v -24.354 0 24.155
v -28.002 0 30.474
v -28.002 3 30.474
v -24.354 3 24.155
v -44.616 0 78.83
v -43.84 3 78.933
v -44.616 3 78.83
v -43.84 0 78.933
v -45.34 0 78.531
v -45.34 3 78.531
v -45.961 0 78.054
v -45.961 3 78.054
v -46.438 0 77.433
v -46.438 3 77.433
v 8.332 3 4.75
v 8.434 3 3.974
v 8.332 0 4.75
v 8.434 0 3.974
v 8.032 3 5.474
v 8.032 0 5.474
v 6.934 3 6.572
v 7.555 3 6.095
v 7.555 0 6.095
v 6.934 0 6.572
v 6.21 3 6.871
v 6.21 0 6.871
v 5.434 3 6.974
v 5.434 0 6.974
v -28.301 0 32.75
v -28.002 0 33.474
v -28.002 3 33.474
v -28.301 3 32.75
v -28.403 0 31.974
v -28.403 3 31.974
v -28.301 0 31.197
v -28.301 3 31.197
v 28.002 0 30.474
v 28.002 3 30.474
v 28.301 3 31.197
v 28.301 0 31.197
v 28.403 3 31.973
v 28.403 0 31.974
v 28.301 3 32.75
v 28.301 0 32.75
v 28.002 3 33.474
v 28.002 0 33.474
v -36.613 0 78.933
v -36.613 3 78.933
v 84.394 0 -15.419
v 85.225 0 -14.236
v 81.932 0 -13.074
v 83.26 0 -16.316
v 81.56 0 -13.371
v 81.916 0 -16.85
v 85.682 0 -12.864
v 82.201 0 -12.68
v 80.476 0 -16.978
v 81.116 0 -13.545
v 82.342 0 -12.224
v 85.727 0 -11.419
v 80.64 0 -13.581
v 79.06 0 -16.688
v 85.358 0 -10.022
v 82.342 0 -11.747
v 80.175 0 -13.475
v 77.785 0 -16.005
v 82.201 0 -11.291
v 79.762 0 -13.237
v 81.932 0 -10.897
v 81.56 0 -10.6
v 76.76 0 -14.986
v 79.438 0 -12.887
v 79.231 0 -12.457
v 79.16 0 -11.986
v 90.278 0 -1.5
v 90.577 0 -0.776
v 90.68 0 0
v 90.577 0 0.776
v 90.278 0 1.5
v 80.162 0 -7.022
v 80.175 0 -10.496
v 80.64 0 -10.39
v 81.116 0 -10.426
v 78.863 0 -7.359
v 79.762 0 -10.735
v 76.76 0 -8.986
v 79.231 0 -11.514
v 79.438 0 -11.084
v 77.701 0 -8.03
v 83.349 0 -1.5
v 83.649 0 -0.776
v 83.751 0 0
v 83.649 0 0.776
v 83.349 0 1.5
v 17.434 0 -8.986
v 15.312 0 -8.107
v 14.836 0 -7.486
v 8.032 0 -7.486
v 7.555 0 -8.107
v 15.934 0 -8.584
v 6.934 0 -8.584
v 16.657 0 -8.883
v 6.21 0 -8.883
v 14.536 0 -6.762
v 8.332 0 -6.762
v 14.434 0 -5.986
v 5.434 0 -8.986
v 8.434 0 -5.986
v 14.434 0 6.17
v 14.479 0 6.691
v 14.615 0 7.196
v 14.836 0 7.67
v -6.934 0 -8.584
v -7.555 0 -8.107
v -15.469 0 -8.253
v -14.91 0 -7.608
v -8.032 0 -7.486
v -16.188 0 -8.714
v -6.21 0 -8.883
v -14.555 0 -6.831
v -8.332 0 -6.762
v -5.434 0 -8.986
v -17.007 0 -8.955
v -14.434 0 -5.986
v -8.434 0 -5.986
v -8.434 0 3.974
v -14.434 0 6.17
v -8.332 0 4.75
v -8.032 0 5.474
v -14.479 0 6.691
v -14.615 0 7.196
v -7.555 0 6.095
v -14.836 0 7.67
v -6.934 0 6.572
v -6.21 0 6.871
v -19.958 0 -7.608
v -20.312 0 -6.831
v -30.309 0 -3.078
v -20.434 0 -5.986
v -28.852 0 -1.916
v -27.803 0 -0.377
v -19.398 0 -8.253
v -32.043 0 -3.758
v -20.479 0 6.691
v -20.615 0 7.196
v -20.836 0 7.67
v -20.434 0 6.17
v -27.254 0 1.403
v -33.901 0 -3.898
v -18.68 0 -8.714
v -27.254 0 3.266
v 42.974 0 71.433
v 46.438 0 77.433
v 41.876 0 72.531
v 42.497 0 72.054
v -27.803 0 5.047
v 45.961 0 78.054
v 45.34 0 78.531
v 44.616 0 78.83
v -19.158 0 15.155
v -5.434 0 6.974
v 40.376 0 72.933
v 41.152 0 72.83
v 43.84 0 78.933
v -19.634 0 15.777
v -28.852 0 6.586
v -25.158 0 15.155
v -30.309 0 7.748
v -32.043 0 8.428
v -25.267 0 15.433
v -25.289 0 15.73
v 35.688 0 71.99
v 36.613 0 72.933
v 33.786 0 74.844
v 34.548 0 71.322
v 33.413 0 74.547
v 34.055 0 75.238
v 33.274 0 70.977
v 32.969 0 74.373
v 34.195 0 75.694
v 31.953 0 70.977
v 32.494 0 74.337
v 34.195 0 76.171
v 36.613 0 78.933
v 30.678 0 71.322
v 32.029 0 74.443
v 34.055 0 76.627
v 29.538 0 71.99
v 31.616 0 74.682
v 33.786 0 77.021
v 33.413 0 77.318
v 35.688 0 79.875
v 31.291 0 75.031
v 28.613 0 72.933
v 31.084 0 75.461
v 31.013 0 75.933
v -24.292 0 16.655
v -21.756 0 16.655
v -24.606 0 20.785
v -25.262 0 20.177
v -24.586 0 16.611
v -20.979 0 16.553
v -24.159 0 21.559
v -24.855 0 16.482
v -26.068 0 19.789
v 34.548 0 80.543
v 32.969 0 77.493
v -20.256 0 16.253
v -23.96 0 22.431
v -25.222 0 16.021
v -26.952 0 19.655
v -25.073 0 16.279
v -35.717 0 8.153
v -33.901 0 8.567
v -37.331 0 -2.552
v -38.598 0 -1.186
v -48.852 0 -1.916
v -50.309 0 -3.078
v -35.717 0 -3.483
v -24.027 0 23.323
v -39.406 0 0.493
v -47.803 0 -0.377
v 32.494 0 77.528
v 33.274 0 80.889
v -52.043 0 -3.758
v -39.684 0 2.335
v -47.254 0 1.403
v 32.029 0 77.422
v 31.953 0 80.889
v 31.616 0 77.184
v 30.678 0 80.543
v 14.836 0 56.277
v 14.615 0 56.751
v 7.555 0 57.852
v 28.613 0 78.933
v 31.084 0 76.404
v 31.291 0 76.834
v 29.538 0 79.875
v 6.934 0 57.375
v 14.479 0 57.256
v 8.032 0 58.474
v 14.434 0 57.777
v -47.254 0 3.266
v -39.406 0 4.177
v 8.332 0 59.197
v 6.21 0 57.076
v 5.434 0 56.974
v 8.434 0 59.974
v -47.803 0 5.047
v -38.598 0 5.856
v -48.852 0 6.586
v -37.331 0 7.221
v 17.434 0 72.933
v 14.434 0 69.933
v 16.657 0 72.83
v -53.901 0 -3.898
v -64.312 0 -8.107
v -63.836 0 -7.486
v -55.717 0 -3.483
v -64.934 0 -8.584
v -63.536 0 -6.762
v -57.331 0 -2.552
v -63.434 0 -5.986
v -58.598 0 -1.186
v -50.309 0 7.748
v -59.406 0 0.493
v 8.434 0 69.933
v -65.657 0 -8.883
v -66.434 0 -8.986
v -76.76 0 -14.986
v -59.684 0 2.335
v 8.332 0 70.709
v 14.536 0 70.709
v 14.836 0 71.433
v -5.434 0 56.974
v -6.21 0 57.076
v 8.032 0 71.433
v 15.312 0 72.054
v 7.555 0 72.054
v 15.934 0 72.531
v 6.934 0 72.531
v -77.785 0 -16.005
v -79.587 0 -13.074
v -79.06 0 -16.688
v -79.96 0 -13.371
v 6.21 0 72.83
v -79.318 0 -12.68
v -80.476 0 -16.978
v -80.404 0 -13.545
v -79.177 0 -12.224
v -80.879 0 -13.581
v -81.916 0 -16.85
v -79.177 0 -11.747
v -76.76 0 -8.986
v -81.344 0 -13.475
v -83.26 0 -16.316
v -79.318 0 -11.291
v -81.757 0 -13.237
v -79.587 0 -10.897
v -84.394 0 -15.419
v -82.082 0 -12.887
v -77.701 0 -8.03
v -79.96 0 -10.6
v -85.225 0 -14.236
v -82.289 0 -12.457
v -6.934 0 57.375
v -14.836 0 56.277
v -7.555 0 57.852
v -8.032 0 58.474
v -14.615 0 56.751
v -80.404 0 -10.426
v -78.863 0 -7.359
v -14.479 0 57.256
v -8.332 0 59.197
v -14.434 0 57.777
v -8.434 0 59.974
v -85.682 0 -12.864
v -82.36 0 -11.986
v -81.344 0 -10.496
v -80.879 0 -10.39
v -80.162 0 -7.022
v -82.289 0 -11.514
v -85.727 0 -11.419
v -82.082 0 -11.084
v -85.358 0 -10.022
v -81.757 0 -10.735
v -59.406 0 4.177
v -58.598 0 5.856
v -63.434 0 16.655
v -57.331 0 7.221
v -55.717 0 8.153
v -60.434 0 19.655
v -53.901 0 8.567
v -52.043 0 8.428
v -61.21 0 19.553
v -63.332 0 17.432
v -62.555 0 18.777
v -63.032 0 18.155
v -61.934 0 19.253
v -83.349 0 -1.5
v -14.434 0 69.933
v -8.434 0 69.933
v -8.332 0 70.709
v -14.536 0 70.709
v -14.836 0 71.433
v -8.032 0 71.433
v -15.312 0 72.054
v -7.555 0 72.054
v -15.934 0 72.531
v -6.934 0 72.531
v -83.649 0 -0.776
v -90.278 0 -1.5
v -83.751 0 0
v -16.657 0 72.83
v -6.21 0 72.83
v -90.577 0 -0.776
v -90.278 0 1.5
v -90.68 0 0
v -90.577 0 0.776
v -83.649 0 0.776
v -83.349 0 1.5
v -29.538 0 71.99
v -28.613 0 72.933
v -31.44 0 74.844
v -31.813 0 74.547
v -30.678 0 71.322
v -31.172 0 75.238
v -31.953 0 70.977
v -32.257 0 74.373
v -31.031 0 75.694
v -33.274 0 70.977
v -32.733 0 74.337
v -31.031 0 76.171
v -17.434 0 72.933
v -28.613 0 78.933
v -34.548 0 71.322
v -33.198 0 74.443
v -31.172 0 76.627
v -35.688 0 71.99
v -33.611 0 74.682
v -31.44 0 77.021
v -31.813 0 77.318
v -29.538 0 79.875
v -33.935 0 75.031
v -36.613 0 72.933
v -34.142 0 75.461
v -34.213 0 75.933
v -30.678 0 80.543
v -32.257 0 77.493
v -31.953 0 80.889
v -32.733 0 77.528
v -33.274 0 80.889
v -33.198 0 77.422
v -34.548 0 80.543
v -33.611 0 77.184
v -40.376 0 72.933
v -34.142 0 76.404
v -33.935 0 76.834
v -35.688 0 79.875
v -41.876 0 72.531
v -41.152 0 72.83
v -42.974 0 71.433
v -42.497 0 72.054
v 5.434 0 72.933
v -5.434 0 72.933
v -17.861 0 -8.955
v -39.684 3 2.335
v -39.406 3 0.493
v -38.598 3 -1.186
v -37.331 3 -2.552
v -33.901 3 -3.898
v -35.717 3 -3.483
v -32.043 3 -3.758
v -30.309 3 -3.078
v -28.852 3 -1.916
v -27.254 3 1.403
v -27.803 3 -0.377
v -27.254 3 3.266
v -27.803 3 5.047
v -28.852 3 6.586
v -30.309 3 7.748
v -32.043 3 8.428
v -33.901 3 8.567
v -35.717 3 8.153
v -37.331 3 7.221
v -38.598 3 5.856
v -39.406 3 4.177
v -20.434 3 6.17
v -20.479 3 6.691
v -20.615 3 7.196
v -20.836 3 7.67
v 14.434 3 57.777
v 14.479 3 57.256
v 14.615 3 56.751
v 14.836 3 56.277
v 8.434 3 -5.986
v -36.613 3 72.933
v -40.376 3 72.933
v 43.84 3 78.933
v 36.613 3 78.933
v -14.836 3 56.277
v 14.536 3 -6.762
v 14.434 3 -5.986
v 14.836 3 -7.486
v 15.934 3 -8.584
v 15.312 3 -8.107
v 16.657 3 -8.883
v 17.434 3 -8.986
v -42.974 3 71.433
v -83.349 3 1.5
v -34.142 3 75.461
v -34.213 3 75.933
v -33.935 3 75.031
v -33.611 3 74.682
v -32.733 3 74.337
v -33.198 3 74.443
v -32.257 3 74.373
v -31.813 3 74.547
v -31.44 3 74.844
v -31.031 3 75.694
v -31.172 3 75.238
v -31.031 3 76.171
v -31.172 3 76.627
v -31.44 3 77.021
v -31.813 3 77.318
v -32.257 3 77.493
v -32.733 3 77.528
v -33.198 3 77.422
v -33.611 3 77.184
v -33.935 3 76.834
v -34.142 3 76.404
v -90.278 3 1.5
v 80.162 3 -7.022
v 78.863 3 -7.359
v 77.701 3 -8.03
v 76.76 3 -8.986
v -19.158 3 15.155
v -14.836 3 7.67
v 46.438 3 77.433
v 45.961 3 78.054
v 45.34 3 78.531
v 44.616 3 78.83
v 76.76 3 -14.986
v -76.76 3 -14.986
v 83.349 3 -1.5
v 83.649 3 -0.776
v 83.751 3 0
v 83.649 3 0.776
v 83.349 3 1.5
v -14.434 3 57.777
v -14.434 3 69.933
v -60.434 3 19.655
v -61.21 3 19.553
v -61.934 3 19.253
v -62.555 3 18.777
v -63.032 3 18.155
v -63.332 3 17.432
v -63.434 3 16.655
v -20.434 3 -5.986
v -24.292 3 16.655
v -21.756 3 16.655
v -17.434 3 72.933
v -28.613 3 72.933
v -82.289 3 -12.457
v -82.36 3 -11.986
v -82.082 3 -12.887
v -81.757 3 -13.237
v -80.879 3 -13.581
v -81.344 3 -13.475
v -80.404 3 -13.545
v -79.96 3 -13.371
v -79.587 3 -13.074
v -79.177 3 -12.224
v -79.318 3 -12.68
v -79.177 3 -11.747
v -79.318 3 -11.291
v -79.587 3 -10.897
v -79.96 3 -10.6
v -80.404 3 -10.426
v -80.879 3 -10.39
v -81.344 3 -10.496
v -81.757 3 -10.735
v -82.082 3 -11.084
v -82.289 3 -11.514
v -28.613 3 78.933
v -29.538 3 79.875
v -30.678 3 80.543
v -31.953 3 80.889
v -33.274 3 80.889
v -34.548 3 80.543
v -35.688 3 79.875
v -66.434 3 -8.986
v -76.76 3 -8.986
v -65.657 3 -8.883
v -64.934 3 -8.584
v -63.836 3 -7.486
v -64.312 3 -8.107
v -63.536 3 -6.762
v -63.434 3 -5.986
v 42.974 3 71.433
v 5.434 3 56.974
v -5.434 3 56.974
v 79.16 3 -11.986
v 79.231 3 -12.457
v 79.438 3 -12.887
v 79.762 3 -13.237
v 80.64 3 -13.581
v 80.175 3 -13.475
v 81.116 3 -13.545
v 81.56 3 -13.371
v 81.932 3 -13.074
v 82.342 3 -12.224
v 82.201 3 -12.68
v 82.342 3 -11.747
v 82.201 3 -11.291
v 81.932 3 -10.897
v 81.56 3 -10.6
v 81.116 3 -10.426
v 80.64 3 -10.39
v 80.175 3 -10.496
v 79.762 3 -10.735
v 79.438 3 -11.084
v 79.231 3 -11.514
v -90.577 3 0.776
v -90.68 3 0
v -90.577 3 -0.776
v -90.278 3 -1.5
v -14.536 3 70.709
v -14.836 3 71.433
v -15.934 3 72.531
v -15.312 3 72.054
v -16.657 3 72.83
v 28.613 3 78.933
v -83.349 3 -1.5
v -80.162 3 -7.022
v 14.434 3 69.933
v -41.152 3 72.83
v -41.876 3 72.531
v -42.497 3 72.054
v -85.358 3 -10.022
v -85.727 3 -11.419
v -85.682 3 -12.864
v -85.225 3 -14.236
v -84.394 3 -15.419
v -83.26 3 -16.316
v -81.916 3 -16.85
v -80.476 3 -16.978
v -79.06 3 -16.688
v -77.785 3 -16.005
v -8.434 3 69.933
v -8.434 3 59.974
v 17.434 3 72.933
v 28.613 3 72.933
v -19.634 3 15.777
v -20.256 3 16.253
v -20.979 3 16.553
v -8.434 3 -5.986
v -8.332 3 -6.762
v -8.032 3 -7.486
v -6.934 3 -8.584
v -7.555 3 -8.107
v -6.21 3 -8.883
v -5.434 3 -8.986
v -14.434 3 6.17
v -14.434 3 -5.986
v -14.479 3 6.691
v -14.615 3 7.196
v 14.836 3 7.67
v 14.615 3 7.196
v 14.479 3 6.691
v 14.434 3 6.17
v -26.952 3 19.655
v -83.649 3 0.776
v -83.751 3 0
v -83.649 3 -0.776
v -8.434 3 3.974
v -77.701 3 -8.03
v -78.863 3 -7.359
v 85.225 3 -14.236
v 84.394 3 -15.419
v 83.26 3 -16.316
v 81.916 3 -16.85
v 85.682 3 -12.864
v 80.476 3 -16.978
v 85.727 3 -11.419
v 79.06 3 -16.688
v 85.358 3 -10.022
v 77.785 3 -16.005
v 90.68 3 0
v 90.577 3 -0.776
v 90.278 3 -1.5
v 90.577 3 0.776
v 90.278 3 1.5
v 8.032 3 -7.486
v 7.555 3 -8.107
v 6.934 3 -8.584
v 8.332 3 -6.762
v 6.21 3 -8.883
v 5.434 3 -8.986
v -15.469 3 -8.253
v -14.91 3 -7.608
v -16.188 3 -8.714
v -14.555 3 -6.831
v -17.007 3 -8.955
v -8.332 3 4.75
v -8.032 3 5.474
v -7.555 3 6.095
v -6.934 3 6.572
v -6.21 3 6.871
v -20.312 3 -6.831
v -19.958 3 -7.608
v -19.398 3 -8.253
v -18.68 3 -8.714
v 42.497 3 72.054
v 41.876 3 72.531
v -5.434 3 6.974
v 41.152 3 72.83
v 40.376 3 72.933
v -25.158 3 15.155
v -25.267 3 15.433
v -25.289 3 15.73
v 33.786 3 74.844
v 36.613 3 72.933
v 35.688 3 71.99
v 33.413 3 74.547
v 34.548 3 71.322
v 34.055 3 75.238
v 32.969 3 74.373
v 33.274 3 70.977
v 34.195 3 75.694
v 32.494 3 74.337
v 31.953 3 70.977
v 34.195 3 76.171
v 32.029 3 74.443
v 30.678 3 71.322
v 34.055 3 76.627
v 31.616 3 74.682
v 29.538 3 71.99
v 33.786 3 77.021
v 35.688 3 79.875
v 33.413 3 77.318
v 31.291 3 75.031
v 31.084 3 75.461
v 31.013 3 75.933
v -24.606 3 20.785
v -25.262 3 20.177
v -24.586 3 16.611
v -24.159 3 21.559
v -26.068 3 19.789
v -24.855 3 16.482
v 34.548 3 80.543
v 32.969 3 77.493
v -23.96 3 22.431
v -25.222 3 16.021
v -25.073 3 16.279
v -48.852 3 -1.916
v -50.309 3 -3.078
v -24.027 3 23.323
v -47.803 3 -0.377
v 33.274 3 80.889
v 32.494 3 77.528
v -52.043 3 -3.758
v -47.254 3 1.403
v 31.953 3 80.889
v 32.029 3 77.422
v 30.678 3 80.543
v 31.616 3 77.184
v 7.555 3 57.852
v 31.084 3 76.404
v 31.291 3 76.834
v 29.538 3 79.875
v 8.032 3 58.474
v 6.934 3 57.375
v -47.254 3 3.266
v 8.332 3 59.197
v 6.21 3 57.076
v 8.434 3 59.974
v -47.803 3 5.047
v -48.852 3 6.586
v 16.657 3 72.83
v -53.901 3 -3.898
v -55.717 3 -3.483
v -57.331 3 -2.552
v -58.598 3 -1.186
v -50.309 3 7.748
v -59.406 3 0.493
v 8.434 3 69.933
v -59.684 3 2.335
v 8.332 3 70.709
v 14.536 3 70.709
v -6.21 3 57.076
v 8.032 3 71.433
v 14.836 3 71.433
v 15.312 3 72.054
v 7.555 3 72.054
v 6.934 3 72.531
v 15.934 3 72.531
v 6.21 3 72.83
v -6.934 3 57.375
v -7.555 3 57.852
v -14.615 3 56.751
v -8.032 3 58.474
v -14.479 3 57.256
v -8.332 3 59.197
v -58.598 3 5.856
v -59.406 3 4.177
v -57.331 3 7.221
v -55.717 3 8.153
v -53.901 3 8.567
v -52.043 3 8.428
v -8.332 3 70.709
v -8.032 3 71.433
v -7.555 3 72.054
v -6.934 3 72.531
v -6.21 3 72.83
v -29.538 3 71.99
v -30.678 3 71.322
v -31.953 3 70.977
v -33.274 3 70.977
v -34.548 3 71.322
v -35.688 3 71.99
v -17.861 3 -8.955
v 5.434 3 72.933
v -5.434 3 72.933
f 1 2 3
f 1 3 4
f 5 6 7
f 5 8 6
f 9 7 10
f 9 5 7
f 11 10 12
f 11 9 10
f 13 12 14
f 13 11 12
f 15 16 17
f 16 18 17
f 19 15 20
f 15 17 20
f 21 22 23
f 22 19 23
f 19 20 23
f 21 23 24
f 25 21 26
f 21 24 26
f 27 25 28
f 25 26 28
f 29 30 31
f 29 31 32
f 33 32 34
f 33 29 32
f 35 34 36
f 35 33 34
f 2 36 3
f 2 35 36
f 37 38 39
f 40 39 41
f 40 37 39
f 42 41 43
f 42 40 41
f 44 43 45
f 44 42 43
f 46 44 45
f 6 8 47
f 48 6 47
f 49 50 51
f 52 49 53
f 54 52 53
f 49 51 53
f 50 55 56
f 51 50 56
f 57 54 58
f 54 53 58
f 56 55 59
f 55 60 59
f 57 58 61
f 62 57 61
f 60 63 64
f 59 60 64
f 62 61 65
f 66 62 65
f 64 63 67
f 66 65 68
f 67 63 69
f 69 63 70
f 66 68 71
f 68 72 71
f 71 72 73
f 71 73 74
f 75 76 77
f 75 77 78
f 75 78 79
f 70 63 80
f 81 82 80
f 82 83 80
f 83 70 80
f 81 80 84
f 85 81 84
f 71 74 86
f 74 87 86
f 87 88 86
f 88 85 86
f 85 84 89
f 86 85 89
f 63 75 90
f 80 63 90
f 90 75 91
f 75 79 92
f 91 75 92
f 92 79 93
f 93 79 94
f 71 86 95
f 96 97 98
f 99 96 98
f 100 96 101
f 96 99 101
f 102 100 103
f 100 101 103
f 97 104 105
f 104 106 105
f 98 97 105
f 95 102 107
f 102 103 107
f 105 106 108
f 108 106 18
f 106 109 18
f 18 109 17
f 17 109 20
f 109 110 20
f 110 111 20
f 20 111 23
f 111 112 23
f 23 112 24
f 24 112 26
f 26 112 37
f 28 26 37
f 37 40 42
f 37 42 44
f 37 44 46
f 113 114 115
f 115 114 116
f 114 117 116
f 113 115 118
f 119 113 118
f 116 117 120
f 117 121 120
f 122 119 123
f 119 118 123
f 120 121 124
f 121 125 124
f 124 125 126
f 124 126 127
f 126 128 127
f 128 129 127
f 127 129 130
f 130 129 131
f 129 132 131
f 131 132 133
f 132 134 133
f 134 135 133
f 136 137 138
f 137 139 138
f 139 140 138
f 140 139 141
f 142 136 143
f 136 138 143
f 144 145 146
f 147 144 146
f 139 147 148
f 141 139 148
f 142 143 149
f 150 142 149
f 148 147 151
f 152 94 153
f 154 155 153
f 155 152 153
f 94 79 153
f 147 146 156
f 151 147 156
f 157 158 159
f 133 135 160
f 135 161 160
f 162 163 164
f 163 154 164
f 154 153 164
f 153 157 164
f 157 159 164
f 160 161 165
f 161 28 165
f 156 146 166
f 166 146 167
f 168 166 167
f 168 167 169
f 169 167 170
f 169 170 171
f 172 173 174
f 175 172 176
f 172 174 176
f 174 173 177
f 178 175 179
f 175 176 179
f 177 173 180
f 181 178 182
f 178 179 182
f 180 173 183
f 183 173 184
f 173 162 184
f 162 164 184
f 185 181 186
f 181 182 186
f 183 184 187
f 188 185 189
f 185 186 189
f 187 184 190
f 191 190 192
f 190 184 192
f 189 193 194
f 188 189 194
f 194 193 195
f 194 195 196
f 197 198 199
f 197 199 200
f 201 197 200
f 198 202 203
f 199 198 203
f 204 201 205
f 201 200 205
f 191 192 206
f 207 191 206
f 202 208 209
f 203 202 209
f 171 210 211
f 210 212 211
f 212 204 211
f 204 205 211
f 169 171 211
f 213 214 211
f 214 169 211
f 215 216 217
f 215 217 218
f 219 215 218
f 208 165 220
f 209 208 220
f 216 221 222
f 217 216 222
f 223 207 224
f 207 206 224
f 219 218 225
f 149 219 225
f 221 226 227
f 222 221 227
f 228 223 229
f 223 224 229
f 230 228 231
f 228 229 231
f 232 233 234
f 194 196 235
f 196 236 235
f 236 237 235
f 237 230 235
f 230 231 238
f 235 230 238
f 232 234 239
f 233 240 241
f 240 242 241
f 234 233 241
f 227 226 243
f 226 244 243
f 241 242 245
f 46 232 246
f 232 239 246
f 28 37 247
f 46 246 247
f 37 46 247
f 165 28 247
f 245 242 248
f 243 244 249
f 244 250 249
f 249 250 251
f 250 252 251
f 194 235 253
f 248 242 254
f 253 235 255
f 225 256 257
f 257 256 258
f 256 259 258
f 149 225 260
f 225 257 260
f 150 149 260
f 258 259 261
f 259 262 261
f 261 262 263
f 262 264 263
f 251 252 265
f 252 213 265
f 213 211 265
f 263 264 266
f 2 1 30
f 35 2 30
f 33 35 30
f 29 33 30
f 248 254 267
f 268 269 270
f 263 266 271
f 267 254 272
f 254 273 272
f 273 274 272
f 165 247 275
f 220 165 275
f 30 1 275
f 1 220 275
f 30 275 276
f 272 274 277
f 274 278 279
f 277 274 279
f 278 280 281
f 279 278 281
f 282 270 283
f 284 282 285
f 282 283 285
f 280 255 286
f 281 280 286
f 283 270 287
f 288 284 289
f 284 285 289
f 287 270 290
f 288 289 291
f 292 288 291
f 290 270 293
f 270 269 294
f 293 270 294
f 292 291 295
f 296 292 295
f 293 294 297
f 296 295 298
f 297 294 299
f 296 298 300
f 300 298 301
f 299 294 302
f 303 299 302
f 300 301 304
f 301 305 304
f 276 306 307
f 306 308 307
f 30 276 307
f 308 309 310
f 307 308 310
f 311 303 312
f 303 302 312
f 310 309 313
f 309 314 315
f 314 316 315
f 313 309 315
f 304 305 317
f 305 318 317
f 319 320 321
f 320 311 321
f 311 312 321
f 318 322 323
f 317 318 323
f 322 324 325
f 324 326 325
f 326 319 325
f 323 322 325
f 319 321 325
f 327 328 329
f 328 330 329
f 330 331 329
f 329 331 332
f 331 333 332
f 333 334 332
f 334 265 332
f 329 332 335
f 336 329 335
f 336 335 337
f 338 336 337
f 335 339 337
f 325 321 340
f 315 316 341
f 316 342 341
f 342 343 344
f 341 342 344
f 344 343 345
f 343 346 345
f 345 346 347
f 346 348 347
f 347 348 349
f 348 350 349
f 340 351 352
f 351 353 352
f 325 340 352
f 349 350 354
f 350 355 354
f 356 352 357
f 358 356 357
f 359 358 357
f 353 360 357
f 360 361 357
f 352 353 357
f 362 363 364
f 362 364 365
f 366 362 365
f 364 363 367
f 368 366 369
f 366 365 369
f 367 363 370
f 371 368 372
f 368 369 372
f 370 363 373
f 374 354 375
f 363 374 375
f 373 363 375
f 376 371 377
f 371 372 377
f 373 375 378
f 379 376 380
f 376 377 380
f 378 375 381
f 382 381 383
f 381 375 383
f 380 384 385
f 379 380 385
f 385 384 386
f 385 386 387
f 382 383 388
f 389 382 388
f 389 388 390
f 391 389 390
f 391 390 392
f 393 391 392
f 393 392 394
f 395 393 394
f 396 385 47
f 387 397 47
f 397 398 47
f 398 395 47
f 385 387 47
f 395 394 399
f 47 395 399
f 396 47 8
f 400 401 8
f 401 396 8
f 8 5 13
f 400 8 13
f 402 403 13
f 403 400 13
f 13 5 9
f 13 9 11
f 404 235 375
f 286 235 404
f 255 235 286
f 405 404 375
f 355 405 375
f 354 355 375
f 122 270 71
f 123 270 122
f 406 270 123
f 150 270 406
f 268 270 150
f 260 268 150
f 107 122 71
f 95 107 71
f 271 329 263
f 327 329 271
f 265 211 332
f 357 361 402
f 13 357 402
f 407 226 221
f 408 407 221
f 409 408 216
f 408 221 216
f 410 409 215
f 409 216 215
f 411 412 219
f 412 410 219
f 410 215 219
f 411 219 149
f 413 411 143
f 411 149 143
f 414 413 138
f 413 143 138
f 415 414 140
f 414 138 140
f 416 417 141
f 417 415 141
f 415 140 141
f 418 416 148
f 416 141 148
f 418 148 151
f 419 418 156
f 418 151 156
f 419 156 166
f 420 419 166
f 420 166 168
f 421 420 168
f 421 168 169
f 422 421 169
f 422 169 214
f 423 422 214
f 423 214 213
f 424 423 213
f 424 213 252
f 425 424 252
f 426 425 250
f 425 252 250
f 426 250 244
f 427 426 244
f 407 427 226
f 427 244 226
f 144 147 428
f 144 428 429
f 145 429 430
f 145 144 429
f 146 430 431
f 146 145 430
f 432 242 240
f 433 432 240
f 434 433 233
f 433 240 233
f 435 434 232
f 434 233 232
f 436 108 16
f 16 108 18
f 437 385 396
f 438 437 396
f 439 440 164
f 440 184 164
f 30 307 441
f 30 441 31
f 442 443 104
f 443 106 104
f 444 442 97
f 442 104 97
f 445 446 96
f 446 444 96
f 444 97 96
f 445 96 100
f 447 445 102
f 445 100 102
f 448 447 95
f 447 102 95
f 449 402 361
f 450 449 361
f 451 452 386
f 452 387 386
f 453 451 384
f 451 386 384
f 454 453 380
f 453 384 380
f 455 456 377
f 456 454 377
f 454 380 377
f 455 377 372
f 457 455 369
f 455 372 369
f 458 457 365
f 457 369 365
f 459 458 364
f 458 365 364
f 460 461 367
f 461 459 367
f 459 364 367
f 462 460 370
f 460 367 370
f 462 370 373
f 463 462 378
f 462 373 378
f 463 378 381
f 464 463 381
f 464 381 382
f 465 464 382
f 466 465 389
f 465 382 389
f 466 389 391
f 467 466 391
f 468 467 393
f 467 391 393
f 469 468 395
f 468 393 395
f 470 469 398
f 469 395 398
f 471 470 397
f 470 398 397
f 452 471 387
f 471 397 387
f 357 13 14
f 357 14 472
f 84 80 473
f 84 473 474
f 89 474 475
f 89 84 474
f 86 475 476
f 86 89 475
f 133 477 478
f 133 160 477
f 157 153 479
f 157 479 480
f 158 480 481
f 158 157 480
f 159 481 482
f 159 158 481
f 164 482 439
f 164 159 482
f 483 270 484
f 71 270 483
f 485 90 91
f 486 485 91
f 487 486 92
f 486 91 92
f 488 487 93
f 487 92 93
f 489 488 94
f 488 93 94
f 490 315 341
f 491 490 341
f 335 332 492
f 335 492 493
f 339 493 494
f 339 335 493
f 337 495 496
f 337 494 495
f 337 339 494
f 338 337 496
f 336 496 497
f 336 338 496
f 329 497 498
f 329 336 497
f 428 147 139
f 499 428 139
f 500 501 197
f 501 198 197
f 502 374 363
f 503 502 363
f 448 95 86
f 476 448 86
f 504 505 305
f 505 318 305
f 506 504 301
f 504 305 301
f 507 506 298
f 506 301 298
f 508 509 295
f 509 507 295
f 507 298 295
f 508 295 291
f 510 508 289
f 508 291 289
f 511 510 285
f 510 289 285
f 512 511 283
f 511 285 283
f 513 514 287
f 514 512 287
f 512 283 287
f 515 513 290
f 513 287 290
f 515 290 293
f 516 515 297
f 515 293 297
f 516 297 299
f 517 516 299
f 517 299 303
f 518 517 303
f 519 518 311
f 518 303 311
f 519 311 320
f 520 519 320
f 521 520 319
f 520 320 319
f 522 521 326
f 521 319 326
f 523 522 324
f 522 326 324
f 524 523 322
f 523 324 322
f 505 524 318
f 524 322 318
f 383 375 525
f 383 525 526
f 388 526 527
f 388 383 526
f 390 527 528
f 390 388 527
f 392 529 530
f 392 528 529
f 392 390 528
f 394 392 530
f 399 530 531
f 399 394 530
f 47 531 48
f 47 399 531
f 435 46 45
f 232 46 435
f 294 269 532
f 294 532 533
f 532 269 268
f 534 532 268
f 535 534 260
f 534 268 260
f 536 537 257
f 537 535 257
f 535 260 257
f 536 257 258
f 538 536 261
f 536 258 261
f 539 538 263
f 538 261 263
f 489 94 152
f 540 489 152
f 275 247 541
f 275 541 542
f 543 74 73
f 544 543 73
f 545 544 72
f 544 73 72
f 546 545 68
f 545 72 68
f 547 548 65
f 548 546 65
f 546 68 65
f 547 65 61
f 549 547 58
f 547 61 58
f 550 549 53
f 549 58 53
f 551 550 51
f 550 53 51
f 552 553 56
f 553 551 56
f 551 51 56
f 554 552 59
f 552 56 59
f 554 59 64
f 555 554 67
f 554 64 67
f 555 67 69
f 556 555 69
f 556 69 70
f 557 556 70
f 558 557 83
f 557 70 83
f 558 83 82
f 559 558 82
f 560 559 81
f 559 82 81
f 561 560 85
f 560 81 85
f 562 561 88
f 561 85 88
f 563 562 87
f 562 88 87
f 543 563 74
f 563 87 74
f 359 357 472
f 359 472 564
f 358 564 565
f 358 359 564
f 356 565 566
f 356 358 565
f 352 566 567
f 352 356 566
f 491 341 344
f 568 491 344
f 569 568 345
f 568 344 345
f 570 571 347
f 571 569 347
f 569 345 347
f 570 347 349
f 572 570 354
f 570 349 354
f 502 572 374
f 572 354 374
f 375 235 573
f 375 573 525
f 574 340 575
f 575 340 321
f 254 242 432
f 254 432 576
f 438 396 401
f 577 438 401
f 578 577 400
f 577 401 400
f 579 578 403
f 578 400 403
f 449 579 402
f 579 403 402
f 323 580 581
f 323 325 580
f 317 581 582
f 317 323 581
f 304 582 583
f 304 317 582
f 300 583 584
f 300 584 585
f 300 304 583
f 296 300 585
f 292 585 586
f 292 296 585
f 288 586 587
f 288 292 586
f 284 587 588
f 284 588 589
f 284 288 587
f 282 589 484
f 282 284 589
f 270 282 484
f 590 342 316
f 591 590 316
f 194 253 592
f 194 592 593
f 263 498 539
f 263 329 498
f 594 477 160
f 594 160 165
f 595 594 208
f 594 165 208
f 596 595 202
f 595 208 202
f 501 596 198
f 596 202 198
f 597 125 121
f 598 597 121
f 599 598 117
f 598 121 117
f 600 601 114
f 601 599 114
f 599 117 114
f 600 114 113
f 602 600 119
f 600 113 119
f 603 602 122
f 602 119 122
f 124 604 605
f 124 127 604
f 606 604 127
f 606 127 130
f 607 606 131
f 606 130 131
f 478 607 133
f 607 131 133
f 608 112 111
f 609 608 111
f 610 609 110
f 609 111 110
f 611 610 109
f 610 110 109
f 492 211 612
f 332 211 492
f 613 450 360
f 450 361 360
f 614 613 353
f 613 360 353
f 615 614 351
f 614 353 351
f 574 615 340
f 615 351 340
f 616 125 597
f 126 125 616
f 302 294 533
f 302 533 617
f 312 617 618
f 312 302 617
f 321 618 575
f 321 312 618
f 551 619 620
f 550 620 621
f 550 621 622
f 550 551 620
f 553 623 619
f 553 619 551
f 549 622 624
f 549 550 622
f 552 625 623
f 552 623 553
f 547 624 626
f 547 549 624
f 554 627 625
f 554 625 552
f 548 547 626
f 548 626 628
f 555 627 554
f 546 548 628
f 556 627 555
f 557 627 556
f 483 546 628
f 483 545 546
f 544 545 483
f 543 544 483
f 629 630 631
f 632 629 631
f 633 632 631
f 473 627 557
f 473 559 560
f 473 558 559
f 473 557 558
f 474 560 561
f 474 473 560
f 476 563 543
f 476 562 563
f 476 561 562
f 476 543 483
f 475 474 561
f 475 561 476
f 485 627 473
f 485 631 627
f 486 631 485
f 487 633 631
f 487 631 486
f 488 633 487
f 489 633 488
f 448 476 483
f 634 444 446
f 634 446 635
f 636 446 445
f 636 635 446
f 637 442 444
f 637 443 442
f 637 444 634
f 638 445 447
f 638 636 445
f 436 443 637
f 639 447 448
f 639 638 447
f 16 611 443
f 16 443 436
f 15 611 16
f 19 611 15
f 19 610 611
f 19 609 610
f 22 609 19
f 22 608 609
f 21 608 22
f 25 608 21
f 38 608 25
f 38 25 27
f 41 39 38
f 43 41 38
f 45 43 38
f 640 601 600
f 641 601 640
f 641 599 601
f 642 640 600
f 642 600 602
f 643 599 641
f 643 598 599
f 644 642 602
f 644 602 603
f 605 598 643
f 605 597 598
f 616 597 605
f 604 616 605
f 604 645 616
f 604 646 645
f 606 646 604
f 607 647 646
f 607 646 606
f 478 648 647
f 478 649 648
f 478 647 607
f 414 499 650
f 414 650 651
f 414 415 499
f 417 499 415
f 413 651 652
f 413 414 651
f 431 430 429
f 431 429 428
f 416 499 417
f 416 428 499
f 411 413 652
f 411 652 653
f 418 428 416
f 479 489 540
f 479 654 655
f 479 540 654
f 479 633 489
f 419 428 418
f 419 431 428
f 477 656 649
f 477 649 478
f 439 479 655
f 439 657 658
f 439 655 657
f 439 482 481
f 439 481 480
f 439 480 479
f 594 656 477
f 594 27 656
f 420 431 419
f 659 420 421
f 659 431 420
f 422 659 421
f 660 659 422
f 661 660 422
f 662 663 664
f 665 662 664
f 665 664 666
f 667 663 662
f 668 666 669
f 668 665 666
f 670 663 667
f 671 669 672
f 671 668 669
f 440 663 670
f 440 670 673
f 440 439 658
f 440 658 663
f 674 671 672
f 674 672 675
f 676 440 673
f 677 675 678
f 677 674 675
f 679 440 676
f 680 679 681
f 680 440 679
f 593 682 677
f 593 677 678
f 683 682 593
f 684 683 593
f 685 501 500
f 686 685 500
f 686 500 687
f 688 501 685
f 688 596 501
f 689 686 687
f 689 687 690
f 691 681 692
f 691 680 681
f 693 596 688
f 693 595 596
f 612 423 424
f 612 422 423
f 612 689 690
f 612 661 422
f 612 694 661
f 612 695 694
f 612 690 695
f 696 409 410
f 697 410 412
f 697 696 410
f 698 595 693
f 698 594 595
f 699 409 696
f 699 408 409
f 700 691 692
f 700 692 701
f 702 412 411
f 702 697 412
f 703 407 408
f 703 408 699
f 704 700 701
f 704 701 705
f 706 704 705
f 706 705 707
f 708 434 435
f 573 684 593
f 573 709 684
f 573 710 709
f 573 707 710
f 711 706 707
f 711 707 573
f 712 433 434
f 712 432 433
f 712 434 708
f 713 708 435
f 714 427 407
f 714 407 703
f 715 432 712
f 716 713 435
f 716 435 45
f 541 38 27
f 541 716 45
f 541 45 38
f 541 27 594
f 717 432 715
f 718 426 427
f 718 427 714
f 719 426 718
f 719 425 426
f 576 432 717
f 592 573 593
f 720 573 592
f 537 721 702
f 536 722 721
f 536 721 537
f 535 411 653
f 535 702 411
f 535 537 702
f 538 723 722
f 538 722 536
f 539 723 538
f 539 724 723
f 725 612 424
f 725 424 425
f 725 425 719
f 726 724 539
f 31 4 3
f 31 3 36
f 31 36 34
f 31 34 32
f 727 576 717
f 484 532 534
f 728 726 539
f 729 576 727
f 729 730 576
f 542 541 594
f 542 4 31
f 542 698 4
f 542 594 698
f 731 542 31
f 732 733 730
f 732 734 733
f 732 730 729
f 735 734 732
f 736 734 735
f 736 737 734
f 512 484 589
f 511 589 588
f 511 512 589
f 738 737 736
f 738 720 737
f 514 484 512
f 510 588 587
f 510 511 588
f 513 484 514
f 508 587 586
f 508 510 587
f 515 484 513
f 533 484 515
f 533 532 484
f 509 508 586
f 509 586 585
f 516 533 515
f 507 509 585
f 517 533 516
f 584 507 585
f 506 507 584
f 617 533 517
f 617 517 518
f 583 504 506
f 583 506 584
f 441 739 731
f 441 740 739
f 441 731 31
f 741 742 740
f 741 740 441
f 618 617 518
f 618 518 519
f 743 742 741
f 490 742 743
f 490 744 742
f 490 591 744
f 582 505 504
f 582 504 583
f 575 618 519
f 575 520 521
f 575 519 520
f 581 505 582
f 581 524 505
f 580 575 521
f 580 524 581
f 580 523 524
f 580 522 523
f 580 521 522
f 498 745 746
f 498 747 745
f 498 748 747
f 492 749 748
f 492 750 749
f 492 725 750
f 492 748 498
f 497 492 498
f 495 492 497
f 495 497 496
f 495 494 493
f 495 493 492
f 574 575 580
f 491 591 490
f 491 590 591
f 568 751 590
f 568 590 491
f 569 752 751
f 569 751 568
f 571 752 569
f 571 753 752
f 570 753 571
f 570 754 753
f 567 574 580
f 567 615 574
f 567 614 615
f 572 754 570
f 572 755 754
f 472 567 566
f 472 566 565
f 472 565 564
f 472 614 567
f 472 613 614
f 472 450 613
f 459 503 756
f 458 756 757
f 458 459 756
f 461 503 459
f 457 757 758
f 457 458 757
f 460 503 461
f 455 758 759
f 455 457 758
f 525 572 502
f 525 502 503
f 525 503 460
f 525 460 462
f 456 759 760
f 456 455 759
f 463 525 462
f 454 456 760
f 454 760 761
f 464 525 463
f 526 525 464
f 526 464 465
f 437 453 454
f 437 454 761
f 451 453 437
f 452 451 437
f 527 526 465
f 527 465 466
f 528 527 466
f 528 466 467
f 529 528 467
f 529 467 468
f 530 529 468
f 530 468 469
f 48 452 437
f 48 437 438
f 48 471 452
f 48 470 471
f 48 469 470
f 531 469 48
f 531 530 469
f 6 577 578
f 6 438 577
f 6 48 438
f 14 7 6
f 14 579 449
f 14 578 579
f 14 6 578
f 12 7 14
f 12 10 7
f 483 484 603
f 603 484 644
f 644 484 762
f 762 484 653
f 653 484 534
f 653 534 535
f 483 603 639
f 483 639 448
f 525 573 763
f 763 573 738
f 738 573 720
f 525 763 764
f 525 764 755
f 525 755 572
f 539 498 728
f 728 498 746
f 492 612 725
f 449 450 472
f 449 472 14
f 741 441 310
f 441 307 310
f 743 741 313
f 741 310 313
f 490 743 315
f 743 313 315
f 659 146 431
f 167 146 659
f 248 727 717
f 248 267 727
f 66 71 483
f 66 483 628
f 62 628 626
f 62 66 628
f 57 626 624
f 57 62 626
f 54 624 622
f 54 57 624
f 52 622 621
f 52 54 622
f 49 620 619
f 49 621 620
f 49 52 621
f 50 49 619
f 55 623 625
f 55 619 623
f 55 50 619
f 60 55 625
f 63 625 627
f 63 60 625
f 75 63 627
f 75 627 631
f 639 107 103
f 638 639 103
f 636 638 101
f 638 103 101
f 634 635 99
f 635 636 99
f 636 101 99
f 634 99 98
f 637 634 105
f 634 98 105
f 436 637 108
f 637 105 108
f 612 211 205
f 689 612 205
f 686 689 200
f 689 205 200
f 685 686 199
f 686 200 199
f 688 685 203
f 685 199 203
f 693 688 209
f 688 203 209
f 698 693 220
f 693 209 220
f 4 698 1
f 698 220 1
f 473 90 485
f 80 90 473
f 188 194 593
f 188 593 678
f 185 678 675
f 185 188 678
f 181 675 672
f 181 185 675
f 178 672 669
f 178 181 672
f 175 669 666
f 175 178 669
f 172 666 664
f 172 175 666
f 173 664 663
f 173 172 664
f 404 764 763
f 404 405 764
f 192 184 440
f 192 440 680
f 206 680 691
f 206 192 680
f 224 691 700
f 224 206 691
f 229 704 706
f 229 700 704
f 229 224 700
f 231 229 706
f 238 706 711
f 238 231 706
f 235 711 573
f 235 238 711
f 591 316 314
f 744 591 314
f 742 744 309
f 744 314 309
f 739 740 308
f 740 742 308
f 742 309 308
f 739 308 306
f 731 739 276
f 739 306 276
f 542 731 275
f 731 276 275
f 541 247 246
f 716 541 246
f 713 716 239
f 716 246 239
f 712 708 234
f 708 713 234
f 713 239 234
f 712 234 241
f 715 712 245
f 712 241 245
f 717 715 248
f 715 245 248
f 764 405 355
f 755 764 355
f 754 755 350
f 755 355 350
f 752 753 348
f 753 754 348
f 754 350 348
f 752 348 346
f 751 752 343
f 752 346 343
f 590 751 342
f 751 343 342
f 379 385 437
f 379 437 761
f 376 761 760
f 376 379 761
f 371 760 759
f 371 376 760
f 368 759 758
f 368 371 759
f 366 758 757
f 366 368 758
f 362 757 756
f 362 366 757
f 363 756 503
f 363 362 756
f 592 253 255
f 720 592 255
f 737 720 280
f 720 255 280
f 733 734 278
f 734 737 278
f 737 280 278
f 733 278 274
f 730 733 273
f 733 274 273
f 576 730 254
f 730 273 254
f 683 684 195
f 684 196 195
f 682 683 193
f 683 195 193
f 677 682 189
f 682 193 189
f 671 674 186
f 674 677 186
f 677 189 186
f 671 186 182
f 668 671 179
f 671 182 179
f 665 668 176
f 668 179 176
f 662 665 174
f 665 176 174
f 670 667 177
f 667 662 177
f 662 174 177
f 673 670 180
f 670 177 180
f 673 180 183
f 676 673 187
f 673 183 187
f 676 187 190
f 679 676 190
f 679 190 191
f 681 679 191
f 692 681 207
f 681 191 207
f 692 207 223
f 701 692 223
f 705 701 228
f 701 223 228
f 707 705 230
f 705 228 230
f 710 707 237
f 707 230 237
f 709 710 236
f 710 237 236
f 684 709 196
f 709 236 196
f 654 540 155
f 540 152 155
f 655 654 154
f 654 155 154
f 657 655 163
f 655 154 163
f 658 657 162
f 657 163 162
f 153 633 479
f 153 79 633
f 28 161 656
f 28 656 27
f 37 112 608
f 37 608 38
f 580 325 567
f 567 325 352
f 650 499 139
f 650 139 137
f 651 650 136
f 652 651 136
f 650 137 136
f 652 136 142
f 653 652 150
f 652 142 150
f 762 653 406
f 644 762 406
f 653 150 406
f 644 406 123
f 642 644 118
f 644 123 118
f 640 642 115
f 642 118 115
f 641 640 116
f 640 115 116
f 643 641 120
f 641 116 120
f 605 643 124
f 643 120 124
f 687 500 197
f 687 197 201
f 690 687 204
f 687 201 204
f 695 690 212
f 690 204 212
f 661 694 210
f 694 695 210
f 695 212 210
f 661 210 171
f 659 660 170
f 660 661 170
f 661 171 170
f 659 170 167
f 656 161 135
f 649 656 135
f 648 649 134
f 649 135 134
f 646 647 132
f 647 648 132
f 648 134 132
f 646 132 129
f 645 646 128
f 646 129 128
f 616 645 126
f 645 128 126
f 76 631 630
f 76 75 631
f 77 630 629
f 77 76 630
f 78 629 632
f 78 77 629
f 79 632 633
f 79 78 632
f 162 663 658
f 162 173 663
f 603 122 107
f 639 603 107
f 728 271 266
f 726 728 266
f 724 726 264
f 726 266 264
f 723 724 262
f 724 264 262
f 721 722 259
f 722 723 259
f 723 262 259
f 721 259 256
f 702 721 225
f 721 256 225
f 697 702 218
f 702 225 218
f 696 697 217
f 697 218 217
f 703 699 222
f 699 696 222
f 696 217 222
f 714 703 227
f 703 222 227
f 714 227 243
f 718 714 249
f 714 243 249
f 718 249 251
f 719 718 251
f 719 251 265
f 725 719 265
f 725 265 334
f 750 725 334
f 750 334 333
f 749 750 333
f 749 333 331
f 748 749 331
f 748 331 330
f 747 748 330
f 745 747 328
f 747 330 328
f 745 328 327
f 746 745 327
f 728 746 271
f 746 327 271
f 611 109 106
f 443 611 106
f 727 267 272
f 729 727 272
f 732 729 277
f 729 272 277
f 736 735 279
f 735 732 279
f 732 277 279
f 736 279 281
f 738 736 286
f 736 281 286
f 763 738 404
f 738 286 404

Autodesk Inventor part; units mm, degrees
ref_plane "YZ Plane" through (0, 0, 0) normal (1, 0, 0) x (0, 1, 0)
ref_plane "XZ Plane" through (0, 0, 0) normal (0, 1, 0) x (-1, 0, 0)
ref_plane "XY Plane" through (0, 0, 0) normal (0, 0, 1) x (1, 0, 0)
sketch "Sketch1" plane through (0, 0, 0) normal (0, 1, 0) x (-1, 0, 0)
  circle A0 centre (32.6132, 75.9327) radius 1.6
  circle A1 centre (-32.6132, 75.9327) radius 1.6
  circle A2 centre (80.7596, -11.9856) radius 1.6
  circle A3 centre (-80.7596, -11.9856) radius 1.6
  circle A4 centre (80.7596, -11.9856) radius 5
  circle A5 centre (32.6132, 75.9327) radius 5
  circle A6 centre (-32.6132, 75.9327) radius 5
  circle A7 centre (-80.7596, -11.9856) radius 5
  line L0 (-90.2776, 1.5) -> (-46.4378, 77.4327)
  line L1 (46.4378, 77.4327) -> (90.2776, 1.5)
  line L2 (-83.3494, 1.5) -> (-42.9737, 71.4327)
  line L3 (36.6132, 72.9327) -> (40.3756, 72.9327)
  line L4 (42.9737, 71.4327) -> (83.3494, 1.5)
  line L5 (83.3494, -1.5) -> (80.1615, -7.0215)
  line L6 (85.3577, -10.0215) -> (90.2776, -1.5)
  line L7 (43.8397, 78.9327) -> (36.6132, 78.9327)
  line L8 (-17.4338, 72.9327) -> (-28.6132, 72.9327)
  line L9 (-28.6132, 78.9327) -> (28.6132, 78.9327)
  line L10 (-36.6132, 72.9327) -> (-40.3756, 72.9327)
  line L11 (-36.6132, 78.9327) -> (-43.8397, 78.9327)
  line L12 (-83.3494, -1.5) -> (-80.1615, -7.0215)
  line L13 (-85.3577, -10.0215) -> (-90.2776, -1.5)
  line L14 (-80.7596, -11.9856) -> (-77.7596, -11.9856) construction
  line L15 (76.7596, -14.9856) -> (-76.7596, -14.9856)
  arc A8 (90.2776, -1.5) -> (90.2776, 1.5) centre (87.6795, 0) ccw
  arc A9 (83.3494, -1.5) -> (83.3494, 1.5) centre (80.7513, 0) ccw
  arc A10 (46.4378, 77.4327) -> (43.8397, 78.9327) centre (43.8397, 75.9327) ccw
  arc A11 (42.9737, 71.4327) -> (40.3756, 72.9327) centre (40.3756, 69.9327) ccw
  arc A12 (-43.8397, 78.9327) -> (-46.4378, 77.4327) centre (-43.8397, 75.9327) ccw
  arc A13 (-40.3756, 72.9327) -> (-42.9737, 71.4327) centre (-40.3756, 69.9327) ccw
  arc A14 (-83.3494, 1.5) -> (-83.3494, -1.5) centre (-80.7513, 0) ccw
  arc A15 (-90.2776, 1.5) -> (-90.2776, -1.5) centre (-87.6795, 0) ccw
  line L16 (42.9737, 71.4327) -> (45.4737, 67.1025)
  line L17 (45.4737, 67.1025) -> (48.4737, 61.9064)
  line L18 (-42.9737, 71.4327) -> (-45.4737, 67.1025)
  line L19 (-45.4737, 67.1025) -> (-48.4737, 61.9064)
  line L20 (-23.0235, 72.9327) -> (-26.0235, 72.9327)
  line L21 (-23.0235, 72.9327) -> (-20.0235, 72.9327)
  line L22 (-28.0015, 33.4735) -> (-14.8357, 56.2774)
  line L23 (-5.4338, 56.9735) -> (5.4338, 56.9735)
  line L24 (14.8357, 56.2774) -> (28.0015, 33.4735)
  line L25 (5.4338, 6.9735) -> (-5.4338, 6.9735)
  line L26 (-14.8357, 7.6697) -> (-28.0015, 30.4735)
  line L27 (14.4338, 6.1697) -> (14.4338, -5.9856)
  line L28 (-14.4338, 6.1697) -> (-14.4338, -5.9856)
  line L29 (-8.4338, -5.9856) -> (-8.4338, 3.9735)
  line L30 (8.4338, -5.9856) -> (8.4338, 3.9735)
  line L31 (-14.4338, 57.7774) -> (-14.4338, 69.9327)
  line L32 (-8.4338, 69.9327) -> (-8.4338, 59.9735)
  line L33 (14.4338, 57.7774) -> (14.4338, 69.9327)
  line L34 (8.4338, 69.9327) -> (8.4338, 59.9735)
  arc A16 (14.4338, -5.9856) -> (17.4338, -8.9856) centre (17.4338, -5.9856) ccw
  arc A17 (14.8357, 7.6697) -> (14.4338, 6.1697) centre (17.4338, 6.1697) ccw
  arc A18 (8.4338, 3.9735) -> (5.4338, 6.9735) centre (5.4338, 3.9735) ccw
  arc A19 (-5.4338, 6.9735) -> (-8.4338, 3.9735) centre (-5.4338, 3.9735) ccw
  arc A20 (-14.4338, 6.1697) -> (-14.8357, 7.6697) centre (-17.4338, 6.1697) ccw
  arc A21 (-28.0015, 33.4735) -> (-28.0015, 30.4735) centre (-25.4034, 31.9735) ccw
  arc A22 (28.0015, 30.4735) -> (28.0015, 33.4735) centre (25.4034, 31.9735) ccw
  arc A23 (-14.8357, 56.2774) -> (-14.4338, 57.7774) centre (-17.4338, 57.7774) ccw
  arc A24 (-14.4338, 69.9327) -> (-17.4338, 72.9327) centre (-17.4338, 69.9327) ccw
  arc A25 (5.4338, 56.9735) -> (8.4338, 59.9735) centre (5.4338, 59.9735) ccw
  arc A26 (-8.4338, 59.9735) -> (-5.4338, 56.9735) centre (-5.4338, 59.9735) ccw
  arc A27 (14.4338, 57.7774) -> (14.8357, 56.2774) centre (17.4338, 57.7774) ccw
  line L35 (17.4338, 72.9327) -> (28.6132, 72.9327)
  line L36 (5.4338, 72.9327) -> (-5.4338, 72.9327)
  line L37 (5.4338, -8.9856) -> (-5.4338, -8.9856)
  line L38 (-17.4338, -8.9856) -> (-76.7596, -8.9856)
  arc A28 (5.4338, -8.9856) -> (8.4338, -5.9856) centre (5.4338, -5.9856) ccw
  arc A29 (-8.4338, -5.9856) -> (-5.4338, -8.9856) centre (-5.4338, -5.9856) ccw
  arc A30 (-17.4338, -8.9856) -> (-14.4338, -5.9856) centre (-17.4338, -5.9856) ccw
  arc A31 (-5.4338, 72.9327) -> (-8.4338, 69.9327) centre (-5.4338, 69.9327) ccw
  arc A32 (8.4338, 69.9327) -> (5.4338, 72.9327) centre (5.4338, 69.9327) ccw
  arc A33 (17.4338, 72.9327) -> (14.4338, 69.9327) centre (17.4338, 69.9327) ccw
  circle A34 centre (33.4338, 2.3349) radius 6.25
  circle A35 centre (53.4338, 2.3349) radius 6.25
  line L39 (86.5956, -77.4481) -> (86.5956, -51.4481)
  line L40 (86.5956, -51.4481) -> (74.5956, -51.4481)
  line L41 (-25.4034, 31.9735) -> (-28.8675, 31.9735)
  line L42 (-25.4034, 31.9735) -> (-21.9393, 31.9735) construction
  line L43 (-28.8675, 31.9735) -> (-26.3675, 36.3037)
  line L44 (-26.3675, 36.3037) -> (-54.0335, 52.2766)
  arc A36 (63.4338, 16.6554) -> (60.4338, 19.6554) centre (60.4338, 16.6554) ccw
  line L45 (8.4338, -14.9856) -> (23.4338, -14.9856)
  line L46 (63.4338, 16.6554) -> (63.4338, -5.9856)
  line L47 (21.7557, 16.6554) -> (24.2916, 16.6554)
  line L48 (20.4338, 6.1697) -> (20.4338, -5.9856)
  line L49 (20.8357, 7.6697) -> (25.1576, 15.1554)
  line L50 (28.0015, 30.4735) -> (24.3537, 24.1554)
  line L51 (19.1576, 15.1554) -> (14.8357, 7.6697)
  line L52 (17.4338, -8.9856) -> (17.4338, -8.9856)
  line L53 (66.4338, -8.9856) -> (76.7596, -8.9856)
  arc A37 (17.4338, -8.9856) -> (20.4338, -5.9856) centre (17.4338, -5.9856) ccw
  arc A38 (20.8357, 7.6697) -> (20.4338, 6.1697) centre (23.4338, 6.1697) ccw
  arc A39 (25.1576, 15.1554) -> (24.2916, 16.6554) centre (24.2916, 15.6554) ccw
  arc A40 (21.7557, 16.6554) -> (19.1576, 15.1554) centre (21.7557, 13.6554) ccw
  arc A41 (24.3537, 24.1554) -> (26.9518, 19.6554) centre (26.9518, 22.6554) ccw
  arc A42 (63.4338, -5.9856) -> (66.4338, -8.9856) centre (66.4338, -5.9856) ccw
  line L54 (26.9518, 19.6554) -> (60.4338, 19.6554)
  point P0 (0, 0)
  point P1 (0, 0)
  point P2 (45.5718, 78.9327)
  point P3 (91.1436, 0)
  point P4 (0, 0)
  point P5 (-84.2154, 0)
  point P6 (-42.1077, 72.9327)
  point P7 (-76.7596, -8.9856)
  point P8 (-80.8494, -5.8301)
  point P9 (-74.3148, -8.9856)
  point P10 (80.8494, -5.8301)
  point P11 (74.3148, -8.9856)
  point P12 (-63.1615, 36.4663)
  point P13 (-14.4338, 56.9735)
  point P14 (14.4338, 56.9735)
  point P15 (-14.4338, 6.9735)
  point P16 (-14.4338, -8.9856)
  point P17 (-8.4338, -8.9856)
  point P18 (8.4338, -8.9856)
  point P19 (-8.4338, 72.9327)
  point P20 (14.4338, 72.9327)
  point P21 (8.4338, 72.9327)
  point P22 (20.0236, 16.6554)
  point P23 (26.0236, 16.6554)
  dimension "d0" = 3.2
  dimension "d1" = 3.2
  dimension "d2" = 3.2
  dimension "d3" = 10
  dimension "d4" = 10
  dimension "d24" = 3
  dimension "d27" = 5
  dimension "d29" = 6
  dimension "d31" = 5
  dimension "d33" = 6
  dimension "d36" = 3
  dimension "d37" = 3
  dimension "d39" = 50
  dimension "d44" = 3
  dimension "d45" = 26
  dimension "d46" = 12
  dimension "d47" = 180
  dimension "d48" = 5
  dimension "d49" = 90
  dimension "d54" = 6
  dimension "d56" = 3
  dimension "d57" = 1
  dimension "d58" = 3
extrude "Extrusion1" add sketch "Sketch1" along normal blind 3 contours A4 | A4 L5 A9 L4 A11 L3 A5 L7 A10 L1 A8 L6 | L15 A7 L38 A30 L28 A20 L26 A21 L22 A23 L31 A24 L8 A6 L9 A5 L35 A33 L33 A27 L24 A22 L50 A41 L54 A36 L46 A42 L53 A4 | A7 | L13 A15 L0 A12 L11 A6 L10 A13 L2 A14 L12 A7 | A5 | A6
properties part number "Top Plat"
